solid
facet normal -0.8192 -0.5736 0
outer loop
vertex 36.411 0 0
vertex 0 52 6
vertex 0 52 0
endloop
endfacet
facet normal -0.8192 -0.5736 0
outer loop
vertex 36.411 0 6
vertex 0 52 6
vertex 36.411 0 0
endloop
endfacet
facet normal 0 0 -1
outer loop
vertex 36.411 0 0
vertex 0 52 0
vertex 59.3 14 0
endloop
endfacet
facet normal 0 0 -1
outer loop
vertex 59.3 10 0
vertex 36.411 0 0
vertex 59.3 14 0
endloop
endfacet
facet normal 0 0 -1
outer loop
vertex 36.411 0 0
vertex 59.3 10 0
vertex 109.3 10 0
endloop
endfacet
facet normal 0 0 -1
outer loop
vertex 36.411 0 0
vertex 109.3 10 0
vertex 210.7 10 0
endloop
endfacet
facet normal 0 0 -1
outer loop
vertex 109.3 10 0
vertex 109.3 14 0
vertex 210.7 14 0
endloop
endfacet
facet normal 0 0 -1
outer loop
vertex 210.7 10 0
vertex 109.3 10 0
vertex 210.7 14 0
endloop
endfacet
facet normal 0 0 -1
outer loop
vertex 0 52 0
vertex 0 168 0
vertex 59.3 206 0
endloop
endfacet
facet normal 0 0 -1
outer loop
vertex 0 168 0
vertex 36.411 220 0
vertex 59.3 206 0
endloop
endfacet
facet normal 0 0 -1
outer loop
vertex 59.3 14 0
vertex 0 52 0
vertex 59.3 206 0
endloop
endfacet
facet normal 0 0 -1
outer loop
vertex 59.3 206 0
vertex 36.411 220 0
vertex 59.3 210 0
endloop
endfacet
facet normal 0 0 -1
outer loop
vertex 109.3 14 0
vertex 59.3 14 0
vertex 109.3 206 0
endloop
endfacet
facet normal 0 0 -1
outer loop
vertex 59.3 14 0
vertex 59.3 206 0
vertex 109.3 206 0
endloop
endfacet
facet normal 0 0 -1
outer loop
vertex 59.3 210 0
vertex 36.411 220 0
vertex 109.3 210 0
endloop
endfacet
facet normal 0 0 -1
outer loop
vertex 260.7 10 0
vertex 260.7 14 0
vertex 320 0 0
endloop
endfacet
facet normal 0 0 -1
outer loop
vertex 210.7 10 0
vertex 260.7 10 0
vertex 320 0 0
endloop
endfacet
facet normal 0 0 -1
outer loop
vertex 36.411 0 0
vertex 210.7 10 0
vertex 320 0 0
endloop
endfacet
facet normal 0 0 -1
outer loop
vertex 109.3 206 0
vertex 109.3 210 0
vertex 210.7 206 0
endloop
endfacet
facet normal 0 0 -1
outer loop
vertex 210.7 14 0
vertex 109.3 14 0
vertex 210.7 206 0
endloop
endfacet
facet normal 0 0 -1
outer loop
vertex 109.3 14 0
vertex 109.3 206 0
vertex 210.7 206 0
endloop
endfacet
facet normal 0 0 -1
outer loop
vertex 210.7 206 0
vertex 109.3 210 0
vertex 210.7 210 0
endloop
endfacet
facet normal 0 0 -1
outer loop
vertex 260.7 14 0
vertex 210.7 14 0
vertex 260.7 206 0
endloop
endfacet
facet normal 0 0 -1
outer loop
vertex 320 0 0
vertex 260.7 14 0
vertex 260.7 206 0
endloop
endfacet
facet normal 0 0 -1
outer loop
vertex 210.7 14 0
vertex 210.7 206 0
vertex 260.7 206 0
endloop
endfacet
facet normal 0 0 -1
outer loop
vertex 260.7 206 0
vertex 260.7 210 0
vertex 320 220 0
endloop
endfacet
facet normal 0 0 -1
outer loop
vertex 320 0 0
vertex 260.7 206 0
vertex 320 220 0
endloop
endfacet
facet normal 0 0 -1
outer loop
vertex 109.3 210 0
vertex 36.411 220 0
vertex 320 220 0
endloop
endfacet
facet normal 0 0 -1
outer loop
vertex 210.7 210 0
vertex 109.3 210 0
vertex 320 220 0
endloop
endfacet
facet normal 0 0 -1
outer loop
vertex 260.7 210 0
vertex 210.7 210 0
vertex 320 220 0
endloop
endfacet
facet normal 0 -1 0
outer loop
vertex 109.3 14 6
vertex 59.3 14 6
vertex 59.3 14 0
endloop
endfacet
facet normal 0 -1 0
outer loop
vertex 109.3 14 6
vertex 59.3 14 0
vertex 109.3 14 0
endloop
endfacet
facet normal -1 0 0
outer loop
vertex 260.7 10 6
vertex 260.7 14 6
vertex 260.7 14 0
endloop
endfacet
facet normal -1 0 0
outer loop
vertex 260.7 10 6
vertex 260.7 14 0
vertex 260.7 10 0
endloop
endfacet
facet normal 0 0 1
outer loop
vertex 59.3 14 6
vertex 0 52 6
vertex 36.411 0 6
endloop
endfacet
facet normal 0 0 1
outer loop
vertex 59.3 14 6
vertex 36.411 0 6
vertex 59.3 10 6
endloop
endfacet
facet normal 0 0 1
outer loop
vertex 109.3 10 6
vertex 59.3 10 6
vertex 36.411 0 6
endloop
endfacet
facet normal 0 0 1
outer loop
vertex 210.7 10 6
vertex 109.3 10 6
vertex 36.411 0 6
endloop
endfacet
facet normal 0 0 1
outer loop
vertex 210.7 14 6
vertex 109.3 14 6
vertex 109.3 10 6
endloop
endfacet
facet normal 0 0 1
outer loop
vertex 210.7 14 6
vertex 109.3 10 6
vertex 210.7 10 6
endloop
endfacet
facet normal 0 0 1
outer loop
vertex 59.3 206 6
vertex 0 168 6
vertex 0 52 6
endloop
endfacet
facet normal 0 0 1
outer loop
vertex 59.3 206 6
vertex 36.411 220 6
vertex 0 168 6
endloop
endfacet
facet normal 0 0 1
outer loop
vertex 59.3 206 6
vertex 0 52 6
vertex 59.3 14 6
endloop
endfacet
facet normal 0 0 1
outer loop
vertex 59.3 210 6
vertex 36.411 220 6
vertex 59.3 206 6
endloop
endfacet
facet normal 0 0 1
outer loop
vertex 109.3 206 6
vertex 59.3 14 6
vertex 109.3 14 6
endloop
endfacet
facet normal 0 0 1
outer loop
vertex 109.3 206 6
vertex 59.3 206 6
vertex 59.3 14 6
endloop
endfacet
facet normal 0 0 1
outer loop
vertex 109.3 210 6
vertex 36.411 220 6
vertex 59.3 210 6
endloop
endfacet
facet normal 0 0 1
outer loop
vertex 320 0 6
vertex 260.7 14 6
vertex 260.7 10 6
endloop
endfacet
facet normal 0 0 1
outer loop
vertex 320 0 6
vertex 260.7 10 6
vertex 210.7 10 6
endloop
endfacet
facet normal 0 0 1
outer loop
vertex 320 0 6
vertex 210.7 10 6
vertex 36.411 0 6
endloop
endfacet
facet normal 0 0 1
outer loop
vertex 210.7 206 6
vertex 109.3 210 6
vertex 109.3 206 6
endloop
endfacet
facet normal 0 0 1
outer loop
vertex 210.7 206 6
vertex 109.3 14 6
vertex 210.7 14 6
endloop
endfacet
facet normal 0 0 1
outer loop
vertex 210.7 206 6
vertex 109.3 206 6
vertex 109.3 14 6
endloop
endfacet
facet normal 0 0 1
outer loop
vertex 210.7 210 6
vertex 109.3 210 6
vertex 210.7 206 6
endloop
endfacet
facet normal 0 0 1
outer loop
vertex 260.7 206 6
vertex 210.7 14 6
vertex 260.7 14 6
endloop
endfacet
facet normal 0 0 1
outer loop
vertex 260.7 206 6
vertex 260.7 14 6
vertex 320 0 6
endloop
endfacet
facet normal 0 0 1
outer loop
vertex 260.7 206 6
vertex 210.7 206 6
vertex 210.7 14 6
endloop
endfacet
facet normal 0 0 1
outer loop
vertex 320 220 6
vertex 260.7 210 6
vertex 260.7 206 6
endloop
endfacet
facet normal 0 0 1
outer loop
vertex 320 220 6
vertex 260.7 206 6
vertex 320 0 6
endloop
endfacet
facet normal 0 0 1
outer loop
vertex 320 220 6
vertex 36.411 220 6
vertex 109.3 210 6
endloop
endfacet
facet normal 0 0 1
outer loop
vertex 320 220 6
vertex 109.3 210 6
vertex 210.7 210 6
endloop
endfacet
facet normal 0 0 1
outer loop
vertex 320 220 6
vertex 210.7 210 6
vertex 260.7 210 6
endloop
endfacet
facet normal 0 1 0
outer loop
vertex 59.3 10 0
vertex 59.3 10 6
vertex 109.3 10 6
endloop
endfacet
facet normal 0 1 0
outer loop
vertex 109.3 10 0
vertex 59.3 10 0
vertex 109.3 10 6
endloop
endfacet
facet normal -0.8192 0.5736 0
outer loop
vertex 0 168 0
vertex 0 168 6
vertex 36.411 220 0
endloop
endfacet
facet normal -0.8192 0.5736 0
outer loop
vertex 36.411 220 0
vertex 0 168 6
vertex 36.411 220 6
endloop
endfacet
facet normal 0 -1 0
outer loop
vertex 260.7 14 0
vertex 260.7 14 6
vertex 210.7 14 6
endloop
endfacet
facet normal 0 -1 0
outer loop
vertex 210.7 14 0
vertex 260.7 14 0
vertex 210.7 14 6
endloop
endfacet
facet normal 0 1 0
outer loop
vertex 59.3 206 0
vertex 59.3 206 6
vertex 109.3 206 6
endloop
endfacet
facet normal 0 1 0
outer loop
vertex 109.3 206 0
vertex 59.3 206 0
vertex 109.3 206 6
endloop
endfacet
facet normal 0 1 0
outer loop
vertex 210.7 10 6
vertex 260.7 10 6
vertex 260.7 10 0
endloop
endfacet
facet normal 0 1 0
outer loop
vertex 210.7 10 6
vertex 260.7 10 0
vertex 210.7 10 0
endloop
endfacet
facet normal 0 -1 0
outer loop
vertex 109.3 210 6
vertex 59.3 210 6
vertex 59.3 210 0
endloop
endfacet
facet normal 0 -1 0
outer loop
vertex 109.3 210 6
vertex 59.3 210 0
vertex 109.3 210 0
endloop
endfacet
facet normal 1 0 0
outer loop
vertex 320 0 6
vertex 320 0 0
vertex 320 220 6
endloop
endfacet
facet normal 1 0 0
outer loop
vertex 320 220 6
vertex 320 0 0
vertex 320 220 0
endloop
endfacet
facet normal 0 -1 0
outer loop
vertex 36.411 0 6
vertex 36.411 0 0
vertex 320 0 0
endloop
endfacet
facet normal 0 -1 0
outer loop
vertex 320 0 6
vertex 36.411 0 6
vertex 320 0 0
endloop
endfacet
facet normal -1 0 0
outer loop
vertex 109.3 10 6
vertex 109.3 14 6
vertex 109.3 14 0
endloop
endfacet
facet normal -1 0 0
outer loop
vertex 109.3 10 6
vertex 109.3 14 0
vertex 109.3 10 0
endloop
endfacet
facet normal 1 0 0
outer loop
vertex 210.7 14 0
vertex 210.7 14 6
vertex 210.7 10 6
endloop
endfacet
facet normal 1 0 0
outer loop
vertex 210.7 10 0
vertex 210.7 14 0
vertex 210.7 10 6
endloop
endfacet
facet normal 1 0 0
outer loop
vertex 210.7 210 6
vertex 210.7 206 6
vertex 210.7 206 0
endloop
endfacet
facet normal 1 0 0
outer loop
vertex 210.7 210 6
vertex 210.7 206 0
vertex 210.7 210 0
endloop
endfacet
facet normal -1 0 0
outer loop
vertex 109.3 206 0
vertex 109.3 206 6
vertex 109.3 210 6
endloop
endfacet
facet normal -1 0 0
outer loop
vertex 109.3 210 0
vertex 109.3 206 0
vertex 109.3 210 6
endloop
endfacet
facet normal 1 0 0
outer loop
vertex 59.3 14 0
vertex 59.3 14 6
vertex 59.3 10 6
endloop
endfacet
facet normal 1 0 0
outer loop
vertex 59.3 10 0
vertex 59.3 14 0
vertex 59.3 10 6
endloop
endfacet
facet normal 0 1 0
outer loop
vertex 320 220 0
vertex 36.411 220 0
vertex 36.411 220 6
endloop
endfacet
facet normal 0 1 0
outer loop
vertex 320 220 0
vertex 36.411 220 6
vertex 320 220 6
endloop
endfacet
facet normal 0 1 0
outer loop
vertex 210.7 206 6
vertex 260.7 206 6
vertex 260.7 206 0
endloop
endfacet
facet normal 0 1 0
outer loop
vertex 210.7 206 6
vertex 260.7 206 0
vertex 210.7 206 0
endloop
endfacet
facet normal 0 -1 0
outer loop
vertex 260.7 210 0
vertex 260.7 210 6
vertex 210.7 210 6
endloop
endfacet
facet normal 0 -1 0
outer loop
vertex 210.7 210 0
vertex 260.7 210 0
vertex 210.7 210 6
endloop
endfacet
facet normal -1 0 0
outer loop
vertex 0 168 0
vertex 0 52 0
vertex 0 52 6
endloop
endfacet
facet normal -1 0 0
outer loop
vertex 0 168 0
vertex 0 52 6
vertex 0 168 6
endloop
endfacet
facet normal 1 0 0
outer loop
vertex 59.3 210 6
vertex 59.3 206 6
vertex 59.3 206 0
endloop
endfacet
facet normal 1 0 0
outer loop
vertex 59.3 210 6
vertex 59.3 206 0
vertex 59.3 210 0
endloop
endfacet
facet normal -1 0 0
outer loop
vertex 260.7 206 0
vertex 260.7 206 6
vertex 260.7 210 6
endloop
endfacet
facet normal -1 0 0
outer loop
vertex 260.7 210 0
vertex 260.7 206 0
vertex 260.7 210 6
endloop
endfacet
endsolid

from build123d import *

# Parameters (mm, degrees)
SKIZZE1_W                       = 320
SKIZZE1_H                       = 220
AUFSATZ_LINEAR_AUSTRAGEN1_DEPTH = 6
SKIZZE2_W                       = 50
SKIZZE2_H                       = 4
SCHNITT_LINEAR_AUSTRAGEN1_DEPTH = 6
SPIEGELN2_COPY_1_SKETCH_W       = 50
SPIEGELN2_COPY_1_SKETCH_H       = 4
SPIEGELN2_COPY_1_DEPTH          = 6
SCHNITT_LINEAR_AUSTRAGEN2_DEPTH = 6


with BuildPart() as part:
    # Skizze1 → Aufsatz-Linear austragen1 (new body)
    with BuildSketch(Plane.XY):
        with Locations((160, 110)):
            Rectangle(SKIZZE1_W, SKIZZE1_H)
    extrude(amount=AUFSATZ_LINEAR_AUSTRAGEN1_DEPTH)

    # Skizze2 → Schnitt-Linear austragen1 (cut)
    with BuildSketch(Plane.XY.offset(6)):
        with Locations((84.3, 208)):
            Rectangle(SKIZZE2_W, SKIZZE2_H)
    schnitt_linear_austragen1 = extrude(amount=-SCHNITT_LINEAR_AUSTRAGEN1_DEPTH, mode=Mode.SUBTRACT)

    # Spiegeln1: Schnitt-Linear austragen1 across plane
    add(schnitt_linear_austragen1.mirror(Plane(origin=(160, 0, 0), x_dir=(0, 0, 1), z_dir=(1, 0, 0))), mode=Mode.SUBTRACT)

    # Spiegeln2: Schnitt-Linear austragen1 across plane
    add(schnitt_linear_austragen1.mirror(Plane.ZX.offset(110)), mode=Mode.SUBTRACT)

    # Spiegeln2 copy 1 sketch → Spiegeln2 copy 1 (cut)
    with BuildSketch(Plane(origin=(320, 220, 6), x_dir=(-1, 0, 0), z_dir=(0, 0, 1))):
        with Locations((84.3, 208)):
            Rectangle(SPIEGELN2_COPY_1_SKETCH_W, SPIEGELN2_COPY_1_SKETCH_H)
    extrude(amount=-SPIEGELN2_COPY_1_DEPTH, mode=Mode.SUBTRACT)

    # Skizze3 → Schnitt-Linear austragen2 (cut)
    with BuildSketch(Plane.XY.offset(6)):
        Polygon((0, 52), (36.410791987, 0), (0, 0), align=None)
    schnitt_linear_austragen2 = extrude(amount=-SCHNITT_LINEAR_AUSTRAGEN2_DEPTH, mode=Mode.SUBTRACT)

    # Spiegeln3: Schnitt-Linear austragen2 across plane
    add(schnitt_linear_austragen2.mirror(Plane.ZX.offset(110)), mode=Mode.SUBTRACT)


solid = part.part
